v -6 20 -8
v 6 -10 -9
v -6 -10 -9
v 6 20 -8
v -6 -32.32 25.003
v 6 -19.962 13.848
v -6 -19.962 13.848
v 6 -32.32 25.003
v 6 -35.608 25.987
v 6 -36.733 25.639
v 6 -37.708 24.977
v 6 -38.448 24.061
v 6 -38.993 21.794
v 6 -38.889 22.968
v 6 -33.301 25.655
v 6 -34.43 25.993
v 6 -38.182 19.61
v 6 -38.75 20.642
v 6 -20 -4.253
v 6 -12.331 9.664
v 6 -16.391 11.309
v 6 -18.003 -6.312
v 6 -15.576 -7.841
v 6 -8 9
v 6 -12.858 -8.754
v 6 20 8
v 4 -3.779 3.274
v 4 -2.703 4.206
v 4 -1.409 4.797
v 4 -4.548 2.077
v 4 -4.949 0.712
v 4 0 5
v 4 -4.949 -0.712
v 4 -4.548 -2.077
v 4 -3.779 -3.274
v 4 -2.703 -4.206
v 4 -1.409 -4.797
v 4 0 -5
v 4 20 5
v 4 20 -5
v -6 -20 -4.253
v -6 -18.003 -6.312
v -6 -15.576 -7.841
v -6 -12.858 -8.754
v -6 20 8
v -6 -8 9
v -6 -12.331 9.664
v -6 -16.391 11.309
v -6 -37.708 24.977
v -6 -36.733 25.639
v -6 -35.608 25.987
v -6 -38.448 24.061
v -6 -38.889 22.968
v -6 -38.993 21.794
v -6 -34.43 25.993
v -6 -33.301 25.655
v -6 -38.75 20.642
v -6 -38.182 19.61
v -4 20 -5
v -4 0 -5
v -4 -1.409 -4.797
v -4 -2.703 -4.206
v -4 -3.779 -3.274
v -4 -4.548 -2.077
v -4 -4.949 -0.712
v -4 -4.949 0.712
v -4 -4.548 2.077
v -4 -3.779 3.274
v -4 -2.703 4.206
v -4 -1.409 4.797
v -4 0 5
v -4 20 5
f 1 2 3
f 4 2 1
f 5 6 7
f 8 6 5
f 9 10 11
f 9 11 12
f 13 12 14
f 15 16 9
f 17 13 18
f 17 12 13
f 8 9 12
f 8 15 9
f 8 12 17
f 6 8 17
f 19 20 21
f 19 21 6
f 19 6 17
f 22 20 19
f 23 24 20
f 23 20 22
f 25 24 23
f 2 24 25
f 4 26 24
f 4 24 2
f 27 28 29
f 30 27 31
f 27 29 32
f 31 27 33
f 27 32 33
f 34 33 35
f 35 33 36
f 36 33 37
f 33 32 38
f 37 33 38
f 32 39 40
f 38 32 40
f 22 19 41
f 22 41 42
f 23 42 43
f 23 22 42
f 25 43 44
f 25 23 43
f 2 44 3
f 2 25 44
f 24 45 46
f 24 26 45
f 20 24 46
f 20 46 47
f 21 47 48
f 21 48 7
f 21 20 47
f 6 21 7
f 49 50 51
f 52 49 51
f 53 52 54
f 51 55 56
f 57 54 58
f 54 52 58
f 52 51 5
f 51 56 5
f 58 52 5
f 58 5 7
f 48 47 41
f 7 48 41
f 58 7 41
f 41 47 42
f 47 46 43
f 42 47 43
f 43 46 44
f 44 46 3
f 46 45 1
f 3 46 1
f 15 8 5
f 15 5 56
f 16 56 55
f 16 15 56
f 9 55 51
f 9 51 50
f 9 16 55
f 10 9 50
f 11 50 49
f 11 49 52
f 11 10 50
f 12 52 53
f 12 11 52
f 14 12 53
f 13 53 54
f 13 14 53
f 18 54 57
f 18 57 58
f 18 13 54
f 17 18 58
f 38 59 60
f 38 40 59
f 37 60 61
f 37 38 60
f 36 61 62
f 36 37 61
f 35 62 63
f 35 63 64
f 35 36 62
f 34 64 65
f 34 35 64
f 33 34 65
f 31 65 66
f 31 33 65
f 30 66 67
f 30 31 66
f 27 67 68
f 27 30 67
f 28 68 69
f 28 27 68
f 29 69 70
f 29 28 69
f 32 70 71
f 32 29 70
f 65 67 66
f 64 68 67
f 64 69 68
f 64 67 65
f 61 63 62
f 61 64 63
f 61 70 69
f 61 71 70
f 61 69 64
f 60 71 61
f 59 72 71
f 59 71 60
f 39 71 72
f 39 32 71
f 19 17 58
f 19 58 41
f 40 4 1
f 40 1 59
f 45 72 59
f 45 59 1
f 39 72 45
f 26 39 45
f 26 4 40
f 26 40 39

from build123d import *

# Parameters (mm, degrees)
BOSS_EXTRUDE1_DEPTH = 4
BOSS_EXTRUDE2_START = 6
BOSS_EXTRUDE2_DEPTH = 2
BOSS_EXTRUDE3_START = -4
BOSS_EXTRUDE3_DEPTH = 2


with BuildPart() as part:
    # Sketch1 → Boss-Extrude1 (new, symmetric)
    with BuildSketch(Plane(origin=(0, 0, 0), x_dir=(0, 0, -1), z_dir=(1, 0, 0))):
        with BuildLine():
            Line((-5, 0), (-5, 20))
            Line((-5, 20), (-8, 20))
            Line((-8, 20), (-9, -8))
            ThreePointArc((-9, -8), (-10.368373469, -14.408848081), (-13.847540332, -19.962331457))
            Line((-13.847540332, -19.962331457), (-25.002870304, -32.319666758))
            ThreePointArc((-25.002870304, -32.319666758), (-24.977373246, -37.708310367), (-19.609501747, -38.181687186))
            Line((-19.609501747, -38.181687186), (4.253152151, -20))
            ThreePointArc((4.253152151, -20), (7.840921615, -15.576431351), (9, -10))
            Line((9, -10), (8, 20))
            Line((8, 20), (5, 20))
            Line((5, 20), (5, 0))
            ThreePointArc((5, 0), (0, -5), (-5, 0))
        make_face()
    extrude(amount=BOSS_EXTRUDE1_DEPTH, both=True)

    # Sketch1<3> → Boss-Extrude2 (add)
    with BuildSketch(Plane(origin=(0, 0, 0), x_dir=(0, 0, -1), z_dir=(1, 0, 0)).offset(BOSS_EXTRUDE2_START)):
        with BuildLine():
            Line((5, 20), (-5, 20))
            Line((-5, 20), (-5, 0))
            ThreePointArc((-5, 0), (0, 5), (5, 0))
            Line((5, 0), (5, 20))
        make_face()
        with BuildLine():
            Line((-5, 0), (-5, 20))
            Line((-5, 20), (-8, 20))
            Line((-8, 20), (-9, -8))
            ThreePointArc((-9, -8), (-10.368373469, -14.408848081), (-13.847540332, -19.962331457))
            Line((-13.847540332, -19.962331457), (-25.002870304, -32.319666758))
            ThreePointArc((-25.002870304, -32.319666758), (-24.977373246, -37.708310367), (-19.609501747, -38.181687186))
            Line((-19.609501747, -38.181687186), (4.253152151, -20))
            ThreePointArc((4.253152151, -20), (7.840921615, -15.576431351), (9, -10))
            Line((9, -10), (8, 20))
            Line((8, 20), (5, 20))
            Line((5, 20), (5, 0))
            ThreePointArc((5, 0), (0, -5), (-5, 0))
        make_face()
        with BuildLine():
            ThreePointArc((5, 0), (0, 5), (-5, 0))
            Line((-5, 0), (5, 0))
        make_face()
        with BuildLine():
            Line((5, 0), (-5, 0))
            ThreePointArc((-5, 0), (0, -5), (5, 0))
        make_face()
    extrude(amount=-BOSS_EXTRUDE2_DEPTH)

    # Sketch1<4> → Boss-Extrude3 (add)
    with BuildSketch(Plane(origin=(0, 0, 0), x_dir=(0, 0, -1), z_dir=(1, 0, 0)).offset(BOSS_EXTRUDE3_START)):
        with BuildLine():
            ThreePointArc((5, 0), (0, 5), (-5, 0))
            Line((-5, 0), (5, 0))
        make_face()
        with BuildLine():
            Line((5, 0), (-5, 0))
            ThreePointArc((-5, 0), (0, -5), (5, 0))
        make_face()
        with BuildLine():
            Line((5, 20), (-5, 20))
            Line((-5, 20), (-5, 0))
            ThreePointArc((-5, 0), (0, 5), (5, 0))
            Line((5, 0), (5, 20))
        make_face()
        with BuildLine():
            Line((-5, 0), (-5, 20))
            Line((-5, 20), (-8, 20))
            Line((-8, 20), (-9, -8))
            ThreePointArc((-9, -8), (-10.368373469, -14.408848081), (-13.847540332, -19.962331457))
            Line((-13.847540332, -19.962331457), (-25.002870304, -32.319666758))
            ThreePointArc((-25.002870304, -32.319666758), (-24.977373246, -37.708310367), (-19.609501747, -38.181687186))
            Line((-19.609501747, -38.181687186), (4.253152151, -20))
            ThreePointArc((4.253152151, -20), (7.840921615, -15.576431351), (9, -10))
            Line((9, -10), (8, 20))
            Line((8, 20), (5, 20))
            Line((5, 20), (5, 0))
            ThreePointArc((5, 0), (0, -5), (-5, 0))
        make_face()
    extrude(amount=-BOSS_EXTRUDE3_DEPTH)


solid = part.part
